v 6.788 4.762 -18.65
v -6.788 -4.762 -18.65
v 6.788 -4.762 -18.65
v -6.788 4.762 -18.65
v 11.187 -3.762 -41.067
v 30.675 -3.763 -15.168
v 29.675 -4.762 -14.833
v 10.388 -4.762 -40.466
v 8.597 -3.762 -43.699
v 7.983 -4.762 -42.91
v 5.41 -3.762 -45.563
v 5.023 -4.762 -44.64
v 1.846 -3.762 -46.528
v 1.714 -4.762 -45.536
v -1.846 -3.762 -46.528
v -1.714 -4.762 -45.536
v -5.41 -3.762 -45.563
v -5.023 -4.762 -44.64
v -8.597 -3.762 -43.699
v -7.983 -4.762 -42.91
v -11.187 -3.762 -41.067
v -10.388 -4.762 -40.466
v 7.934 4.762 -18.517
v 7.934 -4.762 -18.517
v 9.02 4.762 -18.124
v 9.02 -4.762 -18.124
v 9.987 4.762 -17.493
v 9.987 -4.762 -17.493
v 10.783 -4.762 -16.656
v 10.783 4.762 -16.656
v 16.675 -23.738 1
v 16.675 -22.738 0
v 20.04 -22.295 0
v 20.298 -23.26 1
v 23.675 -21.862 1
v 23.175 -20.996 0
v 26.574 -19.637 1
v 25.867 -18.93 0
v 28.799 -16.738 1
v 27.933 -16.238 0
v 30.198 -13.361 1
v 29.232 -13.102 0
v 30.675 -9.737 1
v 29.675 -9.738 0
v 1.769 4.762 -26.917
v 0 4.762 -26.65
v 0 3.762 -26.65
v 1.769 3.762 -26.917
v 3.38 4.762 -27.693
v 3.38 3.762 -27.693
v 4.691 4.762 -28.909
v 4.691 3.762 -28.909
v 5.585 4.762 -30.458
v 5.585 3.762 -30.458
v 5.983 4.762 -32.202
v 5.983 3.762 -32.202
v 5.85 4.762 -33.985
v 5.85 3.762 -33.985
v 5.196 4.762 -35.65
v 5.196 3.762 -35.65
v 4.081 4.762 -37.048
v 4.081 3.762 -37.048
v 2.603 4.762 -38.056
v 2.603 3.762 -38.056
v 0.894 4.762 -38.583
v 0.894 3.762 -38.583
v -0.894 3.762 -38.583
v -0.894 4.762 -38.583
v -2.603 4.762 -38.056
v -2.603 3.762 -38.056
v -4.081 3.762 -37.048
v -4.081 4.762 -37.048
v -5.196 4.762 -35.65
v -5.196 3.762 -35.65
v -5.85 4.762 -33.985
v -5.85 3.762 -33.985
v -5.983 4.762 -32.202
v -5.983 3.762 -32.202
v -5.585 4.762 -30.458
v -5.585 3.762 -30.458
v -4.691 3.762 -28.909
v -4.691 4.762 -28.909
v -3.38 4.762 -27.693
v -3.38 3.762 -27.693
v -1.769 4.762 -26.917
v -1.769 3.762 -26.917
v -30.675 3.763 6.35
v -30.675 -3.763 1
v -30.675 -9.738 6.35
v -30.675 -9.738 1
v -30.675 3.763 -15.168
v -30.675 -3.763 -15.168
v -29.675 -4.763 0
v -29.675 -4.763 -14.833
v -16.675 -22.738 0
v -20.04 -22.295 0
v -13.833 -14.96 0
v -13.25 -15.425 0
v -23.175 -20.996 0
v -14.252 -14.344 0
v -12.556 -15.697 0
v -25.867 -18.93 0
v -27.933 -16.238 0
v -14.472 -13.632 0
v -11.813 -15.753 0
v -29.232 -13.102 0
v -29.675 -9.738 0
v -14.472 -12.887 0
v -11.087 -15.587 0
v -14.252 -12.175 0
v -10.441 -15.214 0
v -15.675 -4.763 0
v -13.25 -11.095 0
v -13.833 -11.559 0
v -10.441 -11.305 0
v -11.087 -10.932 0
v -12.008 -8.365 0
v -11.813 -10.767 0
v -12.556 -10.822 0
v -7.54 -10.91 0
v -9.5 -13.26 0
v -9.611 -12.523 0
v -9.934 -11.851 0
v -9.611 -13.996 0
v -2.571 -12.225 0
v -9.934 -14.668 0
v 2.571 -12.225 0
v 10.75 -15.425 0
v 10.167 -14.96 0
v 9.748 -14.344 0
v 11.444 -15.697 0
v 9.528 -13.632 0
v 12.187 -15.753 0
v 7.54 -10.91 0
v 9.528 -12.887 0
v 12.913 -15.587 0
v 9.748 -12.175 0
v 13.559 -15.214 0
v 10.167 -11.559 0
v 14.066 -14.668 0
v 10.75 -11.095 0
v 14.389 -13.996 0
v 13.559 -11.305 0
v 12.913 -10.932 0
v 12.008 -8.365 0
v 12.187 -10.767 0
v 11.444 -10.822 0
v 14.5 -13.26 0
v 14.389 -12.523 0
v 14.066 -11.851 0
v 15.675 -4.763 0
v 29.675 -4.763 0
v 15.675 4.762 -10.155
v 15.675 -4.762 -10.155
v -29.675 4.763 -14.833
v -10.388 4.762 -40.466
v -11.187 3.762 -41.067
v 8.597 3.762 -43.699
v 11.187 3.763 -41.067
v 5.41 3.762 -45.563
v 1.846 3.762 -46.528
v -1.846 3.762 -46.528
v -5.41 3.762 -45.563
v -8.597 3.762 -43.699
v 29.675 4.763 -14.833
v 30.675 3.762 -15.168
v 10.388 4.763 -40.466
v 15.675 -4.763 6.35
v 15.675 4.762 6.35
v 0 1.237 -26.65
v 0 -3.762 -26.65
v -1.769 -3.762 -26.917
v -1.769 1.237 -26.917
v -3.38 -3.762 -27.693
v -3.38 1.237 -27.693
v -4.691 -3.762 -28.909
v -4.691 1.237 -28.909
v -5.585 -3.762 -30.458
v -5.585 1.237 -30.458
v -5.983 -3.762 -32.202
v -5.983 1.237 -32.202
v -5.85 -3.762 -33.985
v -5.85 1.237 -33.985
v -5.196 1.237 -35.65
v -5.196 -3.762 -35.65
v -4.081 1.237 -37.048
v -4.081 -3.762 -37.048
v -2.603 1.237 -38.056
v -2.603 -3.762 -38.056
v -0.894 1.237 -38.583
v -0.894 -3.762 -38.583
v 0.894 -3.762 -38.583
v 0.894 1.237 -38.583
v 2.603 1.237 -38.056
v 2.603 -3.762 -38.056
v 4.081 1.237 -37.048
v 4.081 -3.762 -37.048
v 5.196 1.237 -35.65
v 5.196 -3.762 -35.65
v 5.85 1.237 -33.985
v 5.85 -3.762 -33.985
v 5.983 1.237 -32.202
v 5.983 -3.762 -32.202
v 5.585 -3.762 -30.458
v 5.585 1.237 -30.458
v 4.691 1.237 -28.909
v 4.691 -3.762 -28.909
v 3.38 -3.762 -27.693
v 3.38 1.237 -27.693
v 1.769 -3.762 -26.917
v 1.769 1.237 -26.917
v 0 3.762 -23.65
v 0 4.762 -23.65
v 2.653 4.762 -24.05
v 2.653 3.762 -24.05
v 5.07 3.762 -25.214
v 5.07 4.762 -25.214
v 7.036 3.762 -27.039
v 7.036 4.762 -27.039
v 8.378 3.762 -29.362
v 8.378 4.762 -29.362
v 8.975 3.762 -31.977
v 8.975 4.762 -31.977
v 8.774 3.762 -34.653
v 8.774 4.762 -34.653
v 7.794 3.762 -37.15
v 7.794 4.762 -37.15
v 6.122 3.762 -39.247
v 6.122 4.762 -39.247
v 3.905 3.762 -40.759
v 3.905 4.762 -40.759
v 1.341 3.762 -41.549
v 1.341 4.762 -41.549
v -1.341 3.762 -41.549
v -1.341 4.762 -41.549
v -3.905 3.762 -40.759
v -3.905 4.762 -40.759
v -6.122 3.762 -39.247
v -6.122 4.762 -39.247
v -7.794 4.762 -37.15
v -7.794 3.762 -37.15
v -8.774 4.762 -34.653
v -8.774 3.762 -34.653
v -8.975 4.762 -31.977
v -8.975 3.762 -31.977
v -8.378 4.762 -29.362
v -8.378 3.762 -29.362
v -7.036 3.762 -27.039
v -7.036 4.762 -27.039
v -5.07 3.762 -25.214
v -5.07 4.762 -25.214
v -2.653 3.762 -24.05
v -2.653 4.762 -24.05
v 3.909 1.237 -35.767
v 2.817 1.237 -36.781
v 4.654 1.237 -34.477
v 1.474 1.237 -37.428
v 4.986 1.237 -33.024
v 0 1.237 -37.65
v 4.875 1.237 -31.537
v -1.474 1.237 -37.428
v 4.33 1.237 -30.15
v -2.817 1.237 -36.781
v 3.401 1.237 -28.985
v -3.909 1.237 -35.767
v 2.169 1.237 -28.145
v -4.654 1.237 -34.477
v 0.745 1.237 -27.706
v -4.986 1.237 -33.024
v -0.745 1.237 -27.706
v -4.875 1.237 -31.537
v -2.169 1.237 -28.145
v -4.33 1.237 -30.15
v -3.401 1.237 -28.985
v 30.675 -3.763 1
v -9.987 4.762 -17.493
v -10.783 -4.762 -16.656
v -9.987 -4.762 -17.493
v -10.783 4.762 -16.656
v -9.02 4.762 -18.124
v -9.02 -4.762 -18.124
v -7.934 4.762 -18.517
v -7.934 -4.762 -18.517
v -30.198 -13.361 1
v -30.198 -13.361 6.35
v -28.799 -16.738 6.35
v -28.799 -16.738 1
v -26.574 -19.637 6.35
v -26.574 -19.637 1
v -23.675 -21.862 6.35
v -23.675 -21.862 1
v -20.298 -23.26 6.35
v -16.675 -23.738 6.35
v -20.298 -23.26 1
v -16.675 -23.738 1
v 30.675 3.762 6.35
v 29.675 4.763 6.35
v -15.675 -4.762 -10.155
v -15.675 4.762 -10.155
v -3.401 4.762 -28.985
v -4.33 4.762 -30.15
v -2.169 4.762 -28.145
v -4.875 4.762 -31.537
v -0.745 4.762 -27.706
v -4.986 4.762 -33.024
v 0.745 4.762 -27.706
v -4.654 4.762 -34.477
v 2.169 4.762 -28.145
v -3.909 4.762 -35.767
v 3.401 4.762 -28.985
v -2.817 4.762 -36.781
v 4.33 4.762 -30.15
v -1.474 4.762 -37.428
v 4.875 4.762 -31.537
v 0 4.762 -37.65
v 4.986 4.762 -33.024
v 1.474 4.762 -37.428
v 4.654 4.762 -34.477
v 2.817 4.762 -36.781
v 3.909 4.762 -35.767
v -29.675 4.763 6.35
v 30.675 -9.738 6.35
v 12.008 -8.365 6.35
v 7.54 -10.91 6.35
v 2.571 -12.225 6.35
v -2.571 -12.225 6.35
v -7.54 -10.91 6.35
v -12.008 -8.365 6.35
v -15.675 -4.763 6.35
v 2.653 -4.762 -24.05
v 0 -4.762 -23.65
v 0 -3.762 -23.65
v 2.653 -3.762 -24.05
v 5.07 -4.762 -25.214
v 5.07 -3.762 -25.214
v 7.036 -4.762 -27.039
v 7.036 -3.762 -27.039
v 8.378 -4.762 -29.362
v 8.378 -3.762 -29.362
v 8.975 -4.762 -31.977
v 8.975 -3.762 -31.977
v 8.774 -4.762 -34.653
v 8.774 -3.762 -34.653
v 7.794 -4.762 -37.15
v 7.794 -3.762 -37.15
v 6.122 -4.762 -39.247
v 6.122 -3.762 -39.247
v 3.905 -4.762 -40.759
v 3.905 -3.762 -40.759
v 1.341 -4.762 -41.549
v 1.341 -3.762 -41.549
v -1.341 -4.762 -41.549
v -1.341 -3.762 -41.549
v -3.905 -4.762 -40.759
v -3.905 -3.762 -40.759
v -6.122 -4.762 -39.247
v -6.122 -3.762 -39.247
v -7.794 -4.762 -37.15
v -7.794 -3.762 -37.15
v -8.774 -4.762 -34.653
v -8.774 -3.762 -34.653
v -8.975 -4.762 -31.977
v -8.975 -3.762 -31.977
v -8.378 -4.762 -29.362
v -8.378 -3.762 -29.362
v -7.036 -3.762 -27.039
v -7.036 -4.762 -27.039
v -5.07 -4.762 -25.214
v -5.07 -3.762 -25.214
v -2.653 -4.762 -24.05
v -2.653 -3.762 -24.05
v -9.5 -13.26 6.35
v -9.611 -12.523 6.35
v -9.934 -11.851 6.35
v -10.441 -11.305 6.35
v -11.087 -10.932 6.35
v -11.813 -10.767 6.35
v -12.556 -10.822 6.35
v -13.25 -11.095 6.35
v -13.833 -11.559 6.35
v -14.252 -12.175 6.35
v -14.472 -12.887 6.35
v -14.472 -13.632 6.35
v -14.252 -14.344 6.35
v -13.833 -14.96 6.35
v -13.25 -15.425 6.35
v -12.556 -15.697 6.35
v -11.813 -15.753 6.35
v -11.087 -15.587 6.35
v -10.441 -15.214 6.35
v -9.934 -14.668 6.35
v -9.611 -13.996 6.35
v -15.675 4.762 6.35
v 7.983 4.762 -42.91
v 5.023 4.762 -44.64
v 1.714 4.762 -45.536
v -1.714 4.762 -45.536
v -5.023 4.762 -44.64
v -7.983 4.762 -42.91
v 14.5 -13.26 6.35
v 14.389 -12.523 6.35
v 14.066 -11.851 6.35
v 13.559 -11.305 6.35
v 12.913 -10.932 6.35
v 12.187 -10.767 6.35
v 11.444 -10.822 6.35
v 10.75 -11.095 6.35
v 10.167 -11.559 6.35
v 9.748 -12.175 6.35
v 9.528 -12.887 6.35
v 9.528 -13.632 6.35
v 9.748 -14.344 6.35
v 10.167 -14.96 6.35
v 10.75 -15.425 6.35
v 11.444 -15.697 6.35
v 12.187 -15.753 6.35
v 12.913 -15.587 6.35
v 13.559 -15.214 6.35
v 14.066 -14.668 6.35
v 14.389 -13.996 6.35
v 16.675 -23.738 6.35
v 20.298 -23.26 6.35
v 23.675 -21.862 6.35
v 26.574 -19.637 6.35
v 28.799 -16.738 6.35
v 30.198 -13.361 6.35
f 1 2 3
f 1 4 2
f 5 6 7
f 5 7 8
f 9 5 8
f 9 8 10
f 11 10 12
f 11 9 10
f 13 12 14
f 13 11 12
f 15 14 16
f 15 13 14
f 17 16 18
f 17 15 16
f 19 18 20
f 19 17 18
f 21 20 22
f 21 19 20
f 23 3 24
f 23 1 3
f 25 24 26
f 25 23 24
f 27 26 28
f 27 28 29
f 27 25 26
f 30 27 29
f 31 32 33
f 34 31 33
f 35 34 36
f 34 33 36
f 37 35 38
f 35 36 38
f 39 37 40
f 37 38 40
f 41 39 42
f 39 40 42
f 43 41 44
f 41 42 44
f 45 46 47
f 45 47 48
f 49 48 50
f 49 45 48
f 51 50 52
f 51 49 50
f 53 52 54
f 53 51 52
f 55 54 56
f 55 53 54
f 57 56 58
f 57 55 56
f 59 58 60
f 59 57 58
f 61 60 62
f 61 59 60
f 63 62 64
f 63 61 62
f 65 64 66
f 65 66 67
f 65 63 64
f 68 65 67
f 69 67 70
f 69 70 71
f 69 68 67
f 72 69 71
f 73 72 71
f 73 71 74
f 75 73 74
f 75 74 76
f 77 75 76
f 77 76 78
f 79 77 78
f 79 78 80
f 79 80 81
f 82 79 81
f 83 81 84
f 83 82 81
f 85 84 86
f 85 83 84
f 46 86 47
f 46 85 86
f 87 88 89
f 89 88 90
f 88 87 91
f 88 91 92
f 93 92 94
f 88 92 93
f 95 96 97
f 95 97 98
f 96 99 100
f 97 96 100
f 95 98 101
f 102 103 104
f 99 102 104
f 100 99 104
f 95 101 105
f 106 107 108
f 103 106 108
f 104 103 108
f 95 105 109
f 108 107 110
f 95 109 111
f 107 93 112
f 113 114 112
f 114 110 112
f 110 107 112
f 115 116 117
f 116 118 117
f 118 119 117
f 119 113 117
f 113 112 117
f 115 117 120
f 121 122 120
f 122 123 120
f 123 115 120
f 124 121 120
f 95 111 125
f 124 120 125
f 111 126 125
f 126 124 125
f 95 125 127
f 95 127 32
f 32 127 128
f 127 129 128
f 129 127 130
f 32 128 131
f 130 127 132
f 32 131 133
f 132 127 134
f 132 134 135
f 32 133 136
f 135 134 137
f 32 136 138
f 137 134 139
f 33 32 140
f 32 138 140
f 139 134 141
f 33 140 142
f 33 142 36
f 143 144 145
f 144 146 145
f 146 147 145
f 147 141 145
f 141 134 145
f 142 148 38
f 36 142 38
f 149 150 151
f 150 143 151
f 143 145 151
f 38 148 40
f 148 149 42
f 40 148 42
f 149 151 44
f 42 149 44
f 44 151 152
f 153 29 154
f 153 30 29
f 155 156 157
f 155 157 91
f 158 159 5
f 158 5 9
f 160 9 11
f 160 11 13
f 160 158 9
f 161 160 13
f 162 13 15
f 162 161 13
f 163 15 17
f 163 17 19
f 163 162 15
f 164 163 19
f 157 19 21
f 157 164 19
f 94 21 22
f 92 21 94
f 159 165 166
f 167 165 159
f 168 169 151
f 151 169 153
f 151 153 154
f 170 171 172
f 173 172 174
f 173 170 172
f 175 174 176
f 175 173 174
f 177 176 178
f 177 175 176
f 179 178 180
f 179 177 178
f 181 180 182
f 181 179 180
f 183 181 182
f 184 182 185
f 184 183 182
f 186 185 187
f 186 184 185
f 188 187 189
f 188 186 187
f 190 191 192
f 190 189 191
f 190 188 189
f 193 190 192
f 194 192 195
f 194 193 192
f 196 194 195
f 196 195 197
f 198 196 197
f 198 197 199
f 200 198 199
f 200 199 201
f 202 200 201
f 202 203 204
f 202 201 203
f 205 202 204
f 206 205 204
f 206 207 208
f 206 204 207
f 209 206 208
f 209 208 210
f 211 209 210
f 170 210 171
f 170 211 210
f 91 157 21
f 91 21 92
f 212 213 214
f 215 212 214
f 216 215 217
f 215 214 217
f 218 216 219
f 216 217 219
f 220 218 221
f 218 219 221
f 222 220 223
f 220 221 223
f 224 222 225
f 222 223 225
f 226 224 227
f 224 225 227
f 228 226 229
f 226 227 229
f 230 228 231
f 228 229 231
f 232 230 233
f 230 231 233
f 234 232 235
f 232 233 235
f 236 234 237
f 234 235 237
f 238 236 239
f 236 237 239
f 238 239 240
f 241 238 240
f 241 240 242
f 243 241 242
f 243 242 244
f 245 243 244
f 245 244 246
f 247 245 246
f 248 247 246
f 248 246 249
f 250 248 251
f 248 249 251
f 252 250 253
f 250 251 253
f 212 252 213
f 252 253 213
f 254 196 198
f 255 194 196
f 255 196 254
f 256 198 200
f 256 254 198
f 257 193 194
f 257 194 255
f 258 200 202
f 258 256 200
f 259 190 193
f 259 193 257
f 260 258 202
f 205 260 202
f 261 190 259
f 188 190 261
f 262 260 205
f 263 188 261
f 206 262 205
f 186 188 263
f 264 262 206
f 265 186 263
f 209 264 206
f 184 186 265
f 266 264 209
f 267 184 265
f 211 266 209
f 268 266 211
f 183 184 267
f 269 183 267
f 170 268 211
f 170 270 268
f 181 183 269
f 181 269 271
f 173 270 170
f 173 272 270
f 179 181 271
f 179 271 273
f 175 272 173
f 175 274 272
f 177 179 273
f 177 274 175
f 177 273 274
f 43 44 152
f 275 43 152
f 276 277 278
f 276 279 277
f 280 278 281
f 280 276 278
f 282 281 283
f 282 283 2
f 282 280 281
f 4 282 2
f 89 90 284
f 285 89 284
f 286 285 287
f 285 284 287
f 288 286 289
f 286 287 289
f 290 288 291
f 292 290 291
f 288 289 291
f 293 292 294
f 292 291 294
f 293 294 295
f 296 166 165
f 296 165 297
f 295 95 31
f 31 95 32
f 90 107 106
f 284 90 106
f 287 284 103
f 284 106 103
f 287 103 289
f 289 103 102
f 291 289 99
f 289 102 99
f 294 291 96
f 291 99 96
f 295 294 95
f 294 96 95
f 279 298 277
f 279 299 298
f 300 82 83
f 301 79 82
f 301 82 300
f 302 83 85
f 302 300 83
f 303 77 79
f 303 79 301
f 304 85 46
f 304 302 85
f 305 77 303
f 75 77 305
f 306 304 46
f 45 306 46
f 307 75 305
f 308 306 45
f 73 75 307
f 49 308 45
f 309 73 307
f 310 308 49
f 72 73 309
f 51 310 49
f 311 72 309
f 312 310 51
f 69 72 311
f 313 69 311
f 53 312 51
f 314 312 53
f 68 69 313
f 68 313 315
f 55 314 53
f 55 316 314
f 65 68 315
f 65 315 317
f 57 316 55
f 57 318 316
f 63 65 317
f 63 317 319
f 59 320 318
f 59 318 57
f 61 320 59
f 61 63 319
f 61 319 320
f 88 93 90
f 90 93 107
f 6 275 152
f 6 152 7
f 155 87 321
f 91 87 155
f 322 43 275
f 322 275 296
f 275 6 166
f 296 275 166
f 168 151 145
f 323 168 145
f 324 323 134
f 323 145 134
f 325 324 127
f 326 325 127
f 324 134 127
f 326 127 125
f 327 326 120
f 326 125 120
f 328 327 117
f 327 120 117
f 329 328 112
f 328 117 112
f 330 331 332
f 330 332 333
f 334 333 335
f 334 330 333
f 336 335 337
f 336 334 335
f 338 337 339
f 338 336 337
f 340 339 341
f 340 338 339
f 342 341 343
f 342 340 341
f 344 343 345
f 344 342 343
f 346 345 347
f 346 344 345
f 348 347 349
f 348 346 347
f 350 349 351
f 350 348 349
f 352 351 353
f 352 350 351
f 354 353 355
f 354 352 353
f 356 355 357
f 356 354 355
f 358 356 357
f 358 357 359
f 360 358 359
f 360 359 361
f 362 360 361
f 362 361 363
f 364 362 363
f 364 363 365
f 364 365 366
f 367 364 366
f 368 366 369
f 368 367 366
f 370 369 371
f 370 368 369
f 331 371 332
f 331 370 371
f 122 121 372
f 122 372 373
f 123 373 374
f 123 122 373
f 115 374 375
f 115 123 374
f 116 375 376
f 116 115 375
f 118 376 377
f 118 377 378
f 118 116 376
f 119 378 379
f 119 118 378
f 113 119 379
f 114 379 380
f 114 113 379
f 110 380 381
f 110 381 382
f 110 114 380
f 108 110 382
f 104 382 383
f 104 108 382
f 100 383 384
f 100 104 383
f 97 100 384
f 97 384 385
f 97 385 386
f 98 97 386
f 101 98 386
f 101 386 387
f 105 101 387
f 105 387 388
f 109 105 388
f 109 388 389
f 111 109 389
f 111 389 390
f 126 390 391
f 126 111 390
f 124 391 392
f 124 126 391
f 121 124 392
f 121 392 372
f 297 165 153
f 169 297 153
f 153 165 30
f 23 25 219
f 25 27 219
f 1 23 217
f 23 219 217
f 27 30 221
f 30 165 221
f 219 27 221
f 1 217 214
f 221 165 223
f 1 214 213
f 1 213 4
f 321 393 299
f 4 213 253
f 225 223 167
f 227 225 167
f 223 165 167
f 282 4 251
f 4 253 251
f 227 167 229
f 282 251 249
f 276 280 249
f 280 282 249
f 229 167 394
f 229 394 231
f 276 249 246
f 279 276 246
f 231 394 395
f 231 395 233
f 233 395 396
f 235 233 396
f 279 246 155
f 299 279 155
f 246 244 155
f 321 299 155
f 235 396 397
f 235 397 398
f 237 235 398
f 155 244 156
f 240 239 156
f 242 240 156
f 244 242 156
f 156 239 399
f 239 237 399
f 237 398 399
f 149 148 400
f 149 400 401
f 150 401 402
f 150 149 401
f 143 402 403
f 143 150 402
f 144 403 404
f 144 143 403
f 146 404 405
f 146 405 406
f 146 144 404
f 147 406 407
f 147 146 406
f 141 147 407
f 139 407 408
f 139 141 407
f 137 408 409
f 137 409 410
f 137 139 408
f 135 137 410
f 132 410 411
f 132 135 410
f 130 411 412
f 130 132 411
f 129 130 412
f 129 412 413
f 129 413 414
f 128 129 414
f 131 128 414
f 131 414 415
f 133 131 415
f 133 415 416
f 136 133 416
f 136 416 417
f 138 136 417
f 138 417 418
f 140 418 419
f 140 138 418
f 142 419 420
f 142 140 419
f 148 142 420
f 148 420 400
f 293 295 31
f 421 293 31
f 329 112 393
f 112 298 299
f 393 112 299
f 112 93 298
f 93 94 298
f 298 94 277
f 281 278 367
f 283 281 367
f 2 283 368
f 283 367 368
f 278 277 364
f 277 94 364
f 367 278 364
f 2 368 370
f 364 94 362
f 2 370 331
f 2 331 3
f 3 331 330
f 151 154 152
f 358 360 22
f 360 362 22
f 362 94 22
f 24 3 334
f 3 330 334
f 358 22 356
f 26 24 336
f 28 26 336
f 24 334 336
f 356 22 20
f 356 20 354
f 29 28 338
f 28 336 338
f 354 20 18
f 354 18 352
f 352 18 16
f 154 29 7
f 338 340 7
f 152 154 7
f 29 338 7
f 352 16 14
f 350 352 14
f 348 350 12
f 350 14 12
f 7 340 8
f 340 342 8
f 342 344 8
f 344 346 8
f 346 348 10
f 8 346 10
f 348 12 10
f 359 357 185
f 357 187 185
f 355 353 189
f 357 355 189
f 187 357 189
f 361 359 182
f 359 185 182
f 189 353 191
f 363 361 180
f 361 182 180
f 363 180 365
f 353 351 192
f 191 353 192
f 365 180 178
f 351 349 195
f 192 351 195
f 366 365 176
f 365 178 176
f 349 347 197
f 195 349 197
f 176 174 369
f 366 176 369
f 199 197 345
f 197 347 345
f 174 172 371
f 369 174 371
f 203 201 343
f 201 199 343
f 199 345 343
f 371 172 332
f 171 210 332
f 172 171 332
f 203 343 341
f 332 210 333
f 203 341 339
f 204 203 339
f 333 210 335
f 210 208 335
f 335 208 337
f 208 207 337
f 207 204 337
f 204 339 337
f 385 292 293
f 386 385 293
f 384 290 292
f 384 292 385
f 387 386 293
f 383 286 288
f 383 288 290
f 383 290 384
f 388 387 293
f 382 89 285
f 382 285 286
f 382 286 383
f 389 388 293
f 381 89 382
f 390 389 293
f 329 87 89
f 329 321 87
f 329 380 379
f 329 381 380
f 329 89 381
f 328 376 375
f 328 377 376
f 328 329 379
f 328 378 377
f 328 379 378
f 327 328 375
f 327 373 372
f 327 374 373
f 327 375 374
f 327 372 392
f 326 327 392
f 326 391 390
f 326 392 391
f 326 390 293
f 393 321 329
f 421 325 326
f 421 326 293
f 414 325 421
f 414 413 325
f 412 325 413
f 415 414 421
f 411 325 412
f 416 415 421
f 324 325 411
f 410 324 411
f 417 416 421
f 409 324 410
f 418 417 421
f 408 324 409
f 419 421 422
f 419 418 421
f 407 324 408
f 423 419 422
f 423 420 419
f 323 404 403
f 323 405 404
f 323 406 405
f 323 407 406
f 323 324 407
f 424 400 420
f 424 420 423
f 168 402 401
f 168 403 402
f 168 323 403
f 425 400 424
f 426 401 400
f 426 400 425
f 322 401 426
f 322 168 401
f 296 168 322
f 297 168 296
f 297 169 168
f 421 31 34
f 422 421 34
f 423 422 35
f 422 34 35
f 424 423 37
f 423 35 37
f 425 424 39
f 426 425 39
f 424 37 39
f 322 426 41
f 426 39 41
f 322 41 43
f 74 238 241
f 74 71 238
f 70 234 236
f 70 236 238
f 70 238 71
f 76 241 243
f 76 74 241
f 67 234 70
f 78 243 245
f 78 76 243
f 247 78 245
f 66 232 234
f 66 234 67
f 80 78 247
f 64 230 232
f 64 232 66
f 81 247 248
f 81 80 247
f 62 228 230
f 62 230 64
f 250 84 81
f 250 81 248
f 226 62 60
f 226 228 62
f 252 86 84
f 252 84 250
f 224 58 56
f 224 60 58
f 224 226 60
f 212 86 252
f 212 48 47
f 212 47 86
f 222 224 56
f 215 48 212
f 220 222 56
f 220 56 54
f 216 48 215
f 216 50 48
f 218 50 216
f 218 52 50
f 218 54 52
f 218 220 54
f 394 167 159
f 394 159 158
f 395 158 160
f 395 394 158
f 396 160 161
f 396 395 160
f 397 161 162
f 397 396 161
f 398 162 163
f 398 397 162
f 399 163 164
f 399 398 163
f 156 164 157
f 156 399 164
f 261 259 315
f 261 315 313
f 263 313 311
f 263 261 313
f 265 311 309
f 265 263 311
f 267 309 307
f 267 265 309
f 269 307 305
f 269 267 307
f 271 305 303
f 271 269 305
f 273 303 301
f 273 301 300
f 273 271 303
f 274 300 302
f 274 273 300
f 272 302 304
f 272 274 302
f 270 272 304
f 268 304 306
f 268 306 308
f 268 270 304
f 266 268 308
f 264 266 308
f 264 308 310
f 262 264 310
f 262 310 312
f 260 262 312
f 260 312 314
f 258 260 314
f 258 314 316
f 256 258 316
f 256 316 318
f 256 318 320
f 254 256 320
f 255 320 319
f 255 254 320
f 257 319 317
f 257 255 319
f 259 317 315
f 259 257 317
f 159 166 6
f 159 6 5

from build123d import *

# Parameters (mm, degrees)
SKETCH1_R           = 5
BOSS_EXTRUDE1_DEPTH = 4.7625
SKETCH2_R           = 9
SKETCH2_R_2         = 6
CUT_EXTRUDE1_DEPTH  = 1
FILLET1_R           = 5
CUT_EXTRUDE2_START  = -6
SKETCH3_R           = 6
CUT_EXTRUDE2_DEPTH  = 6
SKETCH4_R           = 2.5
BOSS_EXTRUDE2_DEPTH = 6.35
CHAMFER3_SIZE       = 1


with BuildPart() as part:
    # Sketch1 → Boss-Extrude1 (new, symmetric)
    with BuildSketch(Plane(origin=(0, 0, 0), x_dir=(1, 0, 0), z_dir=(0, 1, 0))):
        with BuildLine():
            Line((-30.675, 0), (-15.675, 0))
            Line((-15.675, 0), (-15.675, 10.154547549))
            Line((-15.675, 10.154547549), (-9.282686693, 18.65))
            Line((-9.282686693, 18.65), (9.282686693, 18.65))
            Line((9.282686693, 18.65), (15.675, 10.154547549))
            Line((15.675, 10.154547549), (15.675, 0))
            Line((15.675, 0), (30.675, 0))
            Line((30.675, 0), (30.675, 15.167545938))
            Line((30.675, 15.167545938), (11.186887419, 41.067455071))
            ThreePointArc((11.186887419, 41.067455071), (0, 46.65), (-11.186887419, 41.067455071))
            Line((-11.186887419, 41.067455071), (-30.675, 15.167545938))
            Line((-30.675, 15.167545938), (-30.675, 0))
        make_face()
        with Locations(Location((0, 32.65, 0), (0, 0, 90))):
            Circle(SKETCH1_R, mode=Mode.SUBTRACT)
    extrude(amount=BOSS_EXTRUDE1_DEPTH, both=True)

    # Sketch2 → Cut-Extrude1 (cut)
    with BuildSketch(Plane(origin=(0, 4.7625, 0), x_dir=(1, 0, 0), z_dir=(0, 1, 0))):
        with Locations(Location((0, 32.65, 0), (0, 0, 270))):
            Circle(SKETCH2_R)
        with Locations(Location((0, 32.65, 0), (0, 0, 270))):
            Circle(SKETCH2_R_2, mode=Mode.SUBTRACT)
    cut_extrude1 = extrude(amount=-CUT_EXTRUDE1_DEPTH, mode=Mode.SUBTRACT)

    # Fillet1
    fillet1_edges = [part.edges().sort_by_distance(p)[0] for p in [
        (9.282686693, 0, -18.65),
        (-9.282686693, 0, -18.65),
    ]]
    fillet(fillet1_edges, radius=FILLET1_R)

    # Sketch3 → Cut-Extrude2 (cut)
    with BuildSketch(Plane.XZ.offset(4.7625).offset(CUT_EXTRUDE2_START)):
        with Locations(Location((0, -32.65, 0), (0, 0, 90))):
            Circle(SKETCH3_R)
    extrude(amount=CUT_EXTRUDE2_DEPTH, mode=Mode.SUBTRACT)

    # Mirror2: Cut-Extrude1 across plane
    add(cut_extrude1.mirror(Plane.ZX), mode=Mode.SUBTRACT)

    # Sketch4 → Boss-Extrude2 (add)
    with BuildSketch(Plane.XY):
        with BuildLine():
            Line((-16.675, -23.7375), (16.675, -23.7375))
            ThreePointArc((16.675, -23.7375), (26.574494937, -19.636994937), (30.675, -9.7375))
            Line((30.675, -9.7375), (30.675, 4.7625))
            Line((30.675, 4.7625), (15.675, 4.7625))
            Line((15.675, 4.7625), (15.675, -4.7625))
            ThreePointArc((15.675, -4.7625), (0, -12.392034951), (-15.675, -4.7625))
            Line((-15.675, -4.7625), (-15.675, 4.7625))
            Line((-15.675, 4.7625), (-30.675, 4.7625))
            Line((-30.675, 4.7625), (-30.675, -9.7375))
            ThreePointArc((-30.675, -9.7375), (-26.574494937, -19.636994937), (-16.675, -23.7375))
        make_face()
        with Locations((-12, -13.259609691)):
            Circle(SKETCH4_R, mode=Mode.SUBTRACT)
        with Locations((12, -13.259609691)):
            Circle(SKETCH4_R, mode=Mode.SUBTRACT)
    extrude(amount=BOSS_EXTRUDE2_DEPTH)

    # Chamfer3
    chamfer3_edges = [part.edges().sort_by_distance(p)[0] for p in [
        (-20.93094371, -4.7625, -28.117500504),
        (0, -4.7625, -46.65),
        (20.93094371, -4.7625, -28.117500504),
        (30.675, -4.7625, -7.583772969),
        (-30.675, -4.7625, -7.583772969),
        (30.675, 4.7625, -4.408772969),
        (20.93094371, 4.7625, -28.117500504),
        (0, 4.7625, -46.65),
        (-20.93094371, 4.7625, -28.117500504),
        (-30.675, 4.7625, -4.408772969),
        (-30.675, -7.25, 0),
        (-26.574494937, -19.636994937, 0),
        (0, -23.7375, 0),
        (26.574494937, -19.636994937, 0),
        (30.675, -7.25, 0),
    ]]
    chamfer(chamfer3_edges, length=CHAMFER3_SIZE)


solid = part.part
